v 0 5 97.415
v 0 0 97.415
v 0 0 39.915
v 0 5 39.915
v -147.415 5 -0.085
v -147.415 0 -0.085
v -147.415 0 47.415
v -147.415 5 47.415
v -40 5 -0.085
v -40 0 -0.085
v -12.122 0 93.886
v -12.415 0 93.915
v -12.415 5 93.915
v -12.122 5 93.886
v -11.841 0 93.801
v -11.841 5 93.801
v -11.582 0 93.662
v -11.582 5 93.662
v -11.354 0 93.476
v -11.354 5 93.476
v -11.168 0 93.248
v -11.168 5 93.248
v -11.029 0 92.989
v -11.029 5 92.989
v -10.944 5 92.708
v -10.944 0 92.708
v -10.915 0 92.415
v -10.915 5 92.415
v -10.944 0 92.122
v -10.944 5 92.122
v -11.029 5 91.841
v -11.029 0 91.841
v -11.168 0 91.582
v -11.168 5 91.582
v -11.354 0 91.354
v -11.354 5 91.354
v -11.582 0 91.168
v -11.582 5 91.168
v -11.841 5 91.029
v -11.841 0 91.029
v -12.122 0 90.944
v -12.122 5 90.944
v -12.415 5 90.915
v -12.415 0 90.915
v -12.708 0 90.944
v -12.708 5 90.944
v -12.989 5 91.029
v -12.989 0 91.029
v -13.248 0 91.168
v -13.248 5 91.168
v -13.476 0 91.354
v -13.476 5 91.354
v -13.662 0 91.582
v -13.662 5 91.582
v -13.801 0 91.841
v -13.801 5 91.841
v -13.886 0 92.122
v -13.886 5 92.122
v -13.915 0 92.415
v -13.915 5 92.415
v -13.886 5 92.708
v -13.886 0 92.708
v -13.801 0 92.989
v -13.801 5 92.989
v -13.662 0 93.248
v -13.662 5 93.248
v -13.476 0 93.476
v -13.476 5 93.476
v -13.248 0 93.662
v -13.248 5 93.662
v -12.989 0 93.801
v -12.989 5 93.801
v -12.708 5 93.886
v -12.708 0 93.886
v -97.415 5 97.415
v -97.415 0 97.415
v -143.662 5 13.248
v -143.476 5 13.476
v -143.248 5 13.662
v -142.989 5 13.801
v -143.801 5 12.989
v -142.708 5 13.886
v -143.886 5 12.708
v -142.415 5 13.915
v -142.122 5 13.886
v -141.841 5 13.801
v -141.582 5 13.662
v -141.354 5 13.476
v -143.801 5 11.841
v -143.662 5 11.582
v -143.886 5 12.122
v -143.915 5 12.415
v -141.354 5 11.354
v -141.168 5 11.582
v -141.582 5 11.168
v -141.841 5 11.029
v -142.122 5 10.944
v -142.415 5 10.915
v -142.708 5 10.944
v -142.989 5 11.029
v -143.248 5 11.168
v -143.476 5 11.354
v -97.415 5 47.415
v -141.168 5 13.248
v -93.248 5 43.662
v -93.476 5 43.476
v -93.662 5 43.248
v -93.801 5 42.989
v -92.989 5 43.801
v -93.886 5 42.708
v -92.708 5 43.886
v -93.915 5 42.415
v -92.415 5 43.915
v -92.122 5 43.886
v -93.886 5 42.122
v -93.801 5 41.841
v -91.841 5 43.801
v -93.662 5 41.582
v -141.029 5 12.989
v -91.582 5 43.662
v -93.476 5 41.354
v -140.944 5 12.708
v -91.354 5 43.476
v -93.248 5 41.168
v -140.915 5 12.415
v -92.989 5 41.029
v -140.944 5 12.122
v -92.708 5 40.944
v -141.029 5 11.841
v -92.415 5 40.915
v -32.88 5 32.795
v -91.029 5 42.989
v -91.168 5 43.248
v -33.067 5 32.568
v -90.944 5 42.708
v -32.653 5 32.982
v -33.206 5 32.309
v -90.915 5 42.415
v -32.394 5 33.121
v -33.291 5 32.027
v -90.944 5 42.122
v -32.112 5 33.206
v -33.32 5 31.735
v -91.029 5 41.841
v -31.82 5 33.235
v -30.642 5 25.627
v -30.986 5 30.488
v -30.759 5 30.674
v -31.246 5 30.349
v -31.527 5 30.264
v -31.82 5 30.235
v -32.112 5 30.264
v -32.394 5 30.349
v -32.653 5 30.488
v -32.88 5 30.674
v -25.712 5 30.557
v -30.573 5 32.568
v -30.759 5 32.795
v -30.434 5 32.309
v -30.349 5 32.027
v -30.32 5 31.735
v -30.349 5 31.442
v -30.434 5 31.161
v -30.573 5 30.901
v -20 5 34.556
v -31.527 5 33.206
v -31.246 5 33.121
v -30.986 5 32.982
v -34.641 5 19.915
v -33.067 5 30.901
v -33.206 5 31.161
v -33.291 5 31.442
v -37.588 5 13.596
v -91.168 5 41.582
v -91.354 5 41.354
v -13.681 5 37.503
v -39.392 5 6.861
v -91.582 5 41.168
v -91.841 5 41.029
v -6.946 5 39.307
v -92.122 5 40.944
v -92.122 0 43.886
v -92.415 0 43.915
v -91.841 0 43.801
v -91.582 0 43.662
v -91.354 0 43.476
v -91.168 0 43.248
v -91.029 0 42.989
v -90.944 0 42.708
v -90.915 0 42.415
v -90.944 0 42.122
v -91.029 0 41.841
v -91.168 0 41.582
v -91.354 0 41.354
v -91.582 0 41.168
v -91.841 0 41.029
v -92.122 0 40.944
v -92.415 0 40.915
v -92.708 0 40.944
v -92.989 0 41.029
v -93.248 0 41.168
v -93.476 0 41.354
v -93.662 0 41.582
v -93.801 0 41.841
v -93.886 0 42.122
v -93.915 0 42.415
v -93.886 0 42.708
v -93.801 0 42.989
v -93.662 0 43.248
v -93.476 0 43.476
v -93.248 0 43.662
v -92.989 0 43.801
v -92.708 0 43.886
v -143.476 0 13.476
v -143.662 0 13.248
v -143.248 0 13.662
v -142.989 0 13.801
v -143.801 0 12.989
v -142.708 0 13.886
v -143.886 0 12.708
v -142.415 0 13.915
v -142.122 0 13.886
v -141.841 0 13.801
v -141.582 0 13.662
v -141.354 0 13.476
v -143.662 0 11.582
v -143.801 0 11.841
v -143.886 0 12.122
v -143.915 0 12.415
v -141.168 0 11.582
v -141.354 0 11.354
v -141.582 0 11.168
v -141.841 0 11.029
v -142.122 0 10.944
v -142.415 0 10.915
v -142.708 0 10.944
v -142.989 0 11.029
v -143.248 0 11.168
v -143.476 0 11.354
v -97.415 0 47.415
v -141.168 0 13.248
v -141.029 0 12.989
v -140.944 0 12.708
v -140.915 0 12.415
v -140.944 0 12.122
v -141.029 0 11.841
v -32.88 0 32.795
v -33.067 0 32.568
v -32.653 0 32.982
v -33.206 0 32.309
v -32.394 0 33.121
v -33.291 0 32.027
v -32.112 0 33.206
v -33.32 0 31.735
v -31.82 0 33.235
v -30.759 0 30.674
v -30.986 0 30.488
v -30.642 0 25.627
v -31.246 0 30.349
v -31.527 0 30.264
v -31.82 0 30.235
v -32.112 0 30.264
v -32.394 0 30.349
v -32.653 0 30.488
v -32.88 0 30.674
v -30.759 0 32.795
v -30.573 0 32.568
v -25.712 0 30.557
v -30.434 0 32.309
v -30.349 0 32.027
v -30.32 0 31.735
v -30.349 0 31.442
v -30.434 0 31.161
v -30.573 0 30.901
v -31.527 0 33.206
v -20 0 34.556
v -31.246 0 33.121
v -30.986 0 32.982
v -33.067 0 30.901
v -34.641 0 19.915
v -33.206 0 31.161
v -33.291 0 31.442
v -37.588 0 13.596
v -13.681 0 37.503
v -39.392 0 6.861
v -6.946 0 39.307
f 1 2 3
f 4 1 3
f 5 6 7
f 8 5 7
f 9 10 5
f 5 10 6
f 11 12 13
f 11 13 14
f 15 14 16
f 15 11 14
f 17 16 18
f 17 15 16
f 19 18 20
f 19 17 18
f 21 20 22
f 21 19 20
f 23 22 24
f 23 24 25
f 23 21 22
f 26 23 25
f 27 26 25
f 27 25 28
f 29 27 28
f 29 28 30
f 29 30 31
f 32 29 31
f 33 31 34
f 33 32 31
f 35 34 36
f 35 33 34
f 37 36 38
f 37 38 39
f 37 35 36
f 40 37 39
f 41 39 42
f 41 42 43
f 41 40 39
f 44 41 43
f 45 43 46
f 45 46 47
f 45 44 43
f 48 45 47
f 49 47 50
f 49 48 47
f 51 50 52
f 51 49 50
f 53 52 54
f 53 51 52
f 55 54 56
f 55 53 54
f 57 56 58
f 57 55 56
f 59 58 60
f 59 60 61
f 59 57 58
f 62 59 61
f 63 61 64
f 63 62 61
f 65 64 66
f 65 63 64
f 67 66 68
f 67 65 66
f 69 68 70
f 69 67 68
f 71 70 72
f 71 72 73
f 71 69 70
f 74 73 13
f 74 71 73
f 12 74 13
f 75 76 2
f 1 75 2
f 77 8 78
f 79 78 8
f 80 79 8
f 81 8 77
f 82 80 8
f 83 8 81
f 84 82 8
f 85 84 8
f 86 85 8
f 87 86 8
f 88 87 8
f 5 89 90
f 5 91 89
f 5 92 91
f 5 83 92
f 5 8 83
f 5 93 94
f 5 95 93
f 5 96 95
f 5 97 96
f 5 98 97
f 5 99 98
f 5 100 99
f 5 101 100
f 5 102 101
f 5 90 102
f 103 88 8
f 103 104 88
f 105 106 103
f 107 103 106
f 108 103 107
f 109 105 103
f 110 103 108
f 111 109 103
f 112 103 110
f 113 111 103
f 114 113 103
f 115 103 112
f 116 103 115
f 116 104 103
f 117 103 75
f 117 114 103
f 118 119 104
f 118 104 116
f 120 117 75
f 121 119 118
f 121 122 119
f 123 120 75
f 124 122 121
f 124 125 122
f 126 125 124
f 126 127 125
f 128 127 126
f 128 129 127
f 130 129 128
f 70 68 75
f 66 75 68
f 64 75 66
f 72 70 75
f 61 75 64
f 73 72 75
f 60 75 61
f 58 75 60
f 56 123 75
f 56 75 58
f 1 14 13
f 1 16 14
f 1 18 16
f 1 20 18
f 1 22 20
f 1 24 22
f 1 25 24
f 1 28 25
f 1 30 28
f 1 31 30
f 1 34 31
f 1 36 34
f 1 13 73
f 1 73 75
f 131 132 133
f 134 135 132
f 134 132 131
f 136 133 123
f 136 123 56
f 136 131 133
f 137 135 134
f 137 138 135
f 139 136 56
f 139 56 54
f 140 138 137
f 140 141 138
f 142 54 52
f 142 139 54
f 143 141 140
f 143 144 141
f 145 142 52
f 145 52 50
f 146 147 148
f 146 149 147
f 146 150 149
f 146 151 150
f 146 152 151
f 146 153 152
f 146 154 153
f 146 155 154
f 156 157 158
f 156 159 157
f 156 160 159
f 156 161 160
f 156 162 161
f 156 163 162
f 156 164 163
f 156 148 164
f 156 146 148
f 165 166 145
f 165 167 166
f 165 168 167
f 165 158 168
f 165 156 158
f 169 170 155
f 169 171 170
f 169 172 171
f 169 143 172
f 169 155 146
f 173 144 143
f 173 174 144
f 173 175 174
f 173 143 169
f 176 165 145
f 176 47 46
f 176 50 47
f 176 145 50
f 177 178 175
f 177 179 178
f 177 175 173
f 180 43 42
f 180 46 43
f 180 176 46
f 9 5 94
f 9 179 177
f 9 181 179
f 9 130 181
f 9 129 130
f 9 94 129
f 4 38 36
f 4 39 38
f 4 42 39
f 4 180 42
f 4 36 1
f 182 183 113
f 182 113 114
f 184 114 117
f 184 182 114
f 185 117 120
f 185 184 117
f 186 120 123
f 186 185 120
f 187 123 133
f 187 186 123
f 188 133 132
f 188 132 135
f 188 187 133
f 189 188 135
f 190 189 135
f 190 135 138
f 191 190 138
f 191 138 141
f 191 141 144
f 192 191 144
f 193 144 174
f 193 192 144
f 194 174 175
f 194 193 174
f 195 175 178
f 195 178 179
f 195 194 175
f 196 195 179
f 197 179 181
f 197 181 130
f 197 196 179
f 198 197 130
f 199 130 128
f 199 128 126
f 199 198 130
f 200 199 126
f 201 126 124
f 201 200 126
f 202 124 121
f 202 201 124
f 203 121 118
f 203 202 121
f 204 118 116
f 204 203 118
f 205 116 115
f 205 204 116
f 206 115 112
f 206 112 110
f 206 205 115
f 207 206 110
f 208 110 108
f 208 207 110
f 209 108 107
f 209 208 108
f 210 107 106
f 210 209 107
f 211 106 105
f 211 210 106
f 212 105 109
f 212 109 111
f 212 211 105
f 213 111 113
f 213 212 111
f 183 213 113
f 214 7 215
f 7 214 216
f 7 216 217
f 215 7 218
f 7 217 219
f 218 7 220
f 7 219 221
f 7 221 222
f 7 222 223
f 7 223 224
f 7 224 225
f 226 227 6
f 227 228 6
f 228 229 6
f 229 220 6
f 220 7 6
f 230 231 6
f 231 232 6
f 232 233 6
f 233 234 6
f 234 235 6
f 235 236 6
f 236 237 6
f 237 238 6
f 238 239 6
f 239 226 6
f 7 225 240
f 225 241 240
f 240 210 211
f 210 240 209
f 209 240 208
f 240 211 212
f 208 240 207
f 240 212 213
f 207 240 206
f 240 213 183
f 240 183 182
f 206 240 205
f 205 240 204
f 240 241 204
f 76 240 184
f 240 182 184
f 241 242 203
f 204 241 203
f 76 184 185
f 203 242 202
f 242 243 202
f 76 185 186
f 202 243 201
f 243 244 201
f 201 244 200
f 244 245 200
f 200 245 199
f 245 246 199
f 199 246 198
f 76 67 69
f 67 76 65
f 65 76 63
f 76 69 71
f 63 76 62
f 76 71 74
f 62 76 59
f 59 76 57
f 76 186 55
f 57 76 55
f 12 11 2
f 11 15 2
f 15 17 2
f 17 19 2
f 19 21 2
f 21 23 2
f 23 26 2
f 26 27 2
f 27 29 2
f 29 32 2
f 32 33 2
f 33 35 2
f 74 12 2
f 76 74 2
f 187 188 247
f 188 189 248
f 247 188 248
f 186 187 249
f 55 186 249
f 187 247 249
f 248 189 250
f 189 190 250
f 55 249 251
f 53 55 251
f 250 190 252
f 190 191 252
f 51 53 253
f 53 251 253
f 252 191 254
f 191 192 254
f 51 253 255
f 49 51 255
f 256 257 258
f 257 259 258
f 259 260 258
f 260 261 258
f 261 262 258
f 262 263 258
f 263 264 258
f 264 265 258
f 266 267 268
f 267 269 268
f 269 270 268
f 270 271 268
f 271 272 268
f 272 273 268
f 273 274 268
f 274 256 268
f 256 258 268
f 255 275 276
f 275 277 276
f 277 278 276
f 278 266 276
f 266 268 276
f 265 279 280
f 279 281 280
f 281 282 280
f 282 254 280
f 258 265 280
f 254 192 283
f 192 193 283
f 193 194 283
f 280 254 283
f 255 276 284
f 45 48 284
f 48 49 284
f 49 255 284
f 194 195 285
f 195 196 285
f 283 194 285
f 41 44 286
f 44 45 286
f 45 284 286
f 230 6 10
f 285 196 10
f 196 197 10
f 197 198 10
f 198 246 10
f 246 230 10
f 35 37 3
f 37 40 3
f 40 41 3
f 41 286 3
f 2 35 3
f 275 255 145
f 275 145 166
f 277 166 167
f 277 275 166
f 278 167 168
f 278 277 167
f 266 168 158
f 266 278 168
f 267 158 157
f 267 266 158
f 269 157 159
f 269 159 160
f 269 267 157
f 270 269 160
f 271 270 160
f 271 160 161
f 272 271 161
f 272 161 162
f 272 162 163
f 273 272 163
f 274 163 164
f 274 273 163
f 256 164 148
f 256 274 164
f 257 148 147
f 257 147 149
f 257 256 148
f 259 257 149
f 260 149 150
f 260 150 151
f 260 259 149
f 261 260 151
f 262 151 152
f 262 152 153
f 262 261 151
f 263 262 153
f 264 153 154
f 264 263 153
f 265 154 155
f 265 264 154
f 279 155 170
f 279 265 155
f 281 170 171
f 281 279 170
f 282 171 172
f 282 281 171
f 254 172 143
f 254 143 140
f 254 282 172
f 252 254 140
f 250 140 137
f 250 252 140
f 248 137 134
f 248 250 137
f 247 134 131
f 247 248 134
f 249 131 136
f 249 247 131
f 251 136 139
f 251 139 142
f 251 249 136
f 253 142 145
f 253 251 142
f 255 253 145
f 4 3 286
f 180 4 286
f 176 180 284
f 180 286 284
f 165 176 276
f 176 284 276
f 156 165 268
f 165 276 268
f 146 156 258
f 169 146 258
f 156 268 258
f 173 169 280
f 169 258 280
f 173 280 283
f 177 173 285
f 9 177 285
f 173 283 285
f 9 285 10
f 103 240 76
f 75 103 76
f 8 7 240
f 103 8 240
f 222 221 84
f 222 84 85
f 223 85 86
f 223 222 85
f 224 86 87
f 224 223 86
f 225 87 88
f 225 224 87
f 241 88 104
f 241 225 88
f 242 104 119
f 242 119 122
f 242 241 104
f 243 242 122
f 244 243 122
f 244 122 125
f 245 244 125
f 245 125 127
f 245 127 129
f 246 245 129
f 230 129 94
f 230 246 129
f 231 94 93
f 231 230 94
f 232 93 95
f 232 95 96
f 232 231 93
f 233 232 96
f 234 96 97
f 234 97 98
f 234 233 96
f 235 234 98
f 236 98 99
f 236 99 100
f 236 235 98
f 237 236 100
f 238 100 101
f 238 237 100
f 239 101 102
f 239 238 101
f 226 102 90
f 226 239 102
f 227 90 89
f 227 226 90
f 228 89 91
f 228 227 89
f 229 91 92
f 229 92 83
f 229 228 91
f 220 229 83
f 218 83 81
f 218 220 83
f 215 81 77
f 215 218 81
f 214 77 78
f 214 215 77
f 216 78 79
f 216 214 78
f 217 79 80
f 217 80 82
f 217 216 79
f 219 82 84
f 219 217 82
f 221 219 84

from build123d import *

# Parameters (mm, degrees)
ESQUISSE1_R        = 1.5
BOSS_EXTRU_1_DEPTH = 5


with BuildPart() as part:
    # Esquisse1 → Boss.-Extru.1 (new body)
    with BuildSketch(Plane(origin=(0, 0, 0), x_dir=(1, 0, 0), z_dir=(0, 1, 0))):
        with BuildLine():
            Line((-97.415, -97.415), (0, -97.415))
            Line((0, -97.415), (0, -39.915))
            ThreePointArc((0, -39.915), (-28.284271247, -28.199271247), (-40, 0.085))
            Line((-40, 0.085), (-147.415, 0.085))
            Line((-147.415, 0.085), (-147.415, -47.415))
            Line((-147.415, -47.415), (-97.415, -47.415))
            Line((-97.415, -47.415), (-97.415, -97.415))
        make_face()
        with Locations(Location((-12.415, -92.415, 0), (0, 0, 270))):
            Circle(ESQUISSE1_R, mode=Mode.SUBTRACT)
        with Locations(Location((-92.415, -42.415, 0), (0, 0, 270))):
            Circle(ESQUISSE1_R, mode=Mode.SUBTRACT)
        with Locations(Location((-142.415, -12.415, 0), (0, 0, 270))):
            Circle(ESQUISSE1_R, mode=Mode.SUBTRACT)
        with Locations(Location((-31.819805153, -31.734805153, 0), (0, 0, 270))):
            Circle(ESQUISSE1_R, mode=Mode.SUBTRACT)
    extrude(amount=BOSS_EXTRU_1_DEPTH)


solid = part.part
